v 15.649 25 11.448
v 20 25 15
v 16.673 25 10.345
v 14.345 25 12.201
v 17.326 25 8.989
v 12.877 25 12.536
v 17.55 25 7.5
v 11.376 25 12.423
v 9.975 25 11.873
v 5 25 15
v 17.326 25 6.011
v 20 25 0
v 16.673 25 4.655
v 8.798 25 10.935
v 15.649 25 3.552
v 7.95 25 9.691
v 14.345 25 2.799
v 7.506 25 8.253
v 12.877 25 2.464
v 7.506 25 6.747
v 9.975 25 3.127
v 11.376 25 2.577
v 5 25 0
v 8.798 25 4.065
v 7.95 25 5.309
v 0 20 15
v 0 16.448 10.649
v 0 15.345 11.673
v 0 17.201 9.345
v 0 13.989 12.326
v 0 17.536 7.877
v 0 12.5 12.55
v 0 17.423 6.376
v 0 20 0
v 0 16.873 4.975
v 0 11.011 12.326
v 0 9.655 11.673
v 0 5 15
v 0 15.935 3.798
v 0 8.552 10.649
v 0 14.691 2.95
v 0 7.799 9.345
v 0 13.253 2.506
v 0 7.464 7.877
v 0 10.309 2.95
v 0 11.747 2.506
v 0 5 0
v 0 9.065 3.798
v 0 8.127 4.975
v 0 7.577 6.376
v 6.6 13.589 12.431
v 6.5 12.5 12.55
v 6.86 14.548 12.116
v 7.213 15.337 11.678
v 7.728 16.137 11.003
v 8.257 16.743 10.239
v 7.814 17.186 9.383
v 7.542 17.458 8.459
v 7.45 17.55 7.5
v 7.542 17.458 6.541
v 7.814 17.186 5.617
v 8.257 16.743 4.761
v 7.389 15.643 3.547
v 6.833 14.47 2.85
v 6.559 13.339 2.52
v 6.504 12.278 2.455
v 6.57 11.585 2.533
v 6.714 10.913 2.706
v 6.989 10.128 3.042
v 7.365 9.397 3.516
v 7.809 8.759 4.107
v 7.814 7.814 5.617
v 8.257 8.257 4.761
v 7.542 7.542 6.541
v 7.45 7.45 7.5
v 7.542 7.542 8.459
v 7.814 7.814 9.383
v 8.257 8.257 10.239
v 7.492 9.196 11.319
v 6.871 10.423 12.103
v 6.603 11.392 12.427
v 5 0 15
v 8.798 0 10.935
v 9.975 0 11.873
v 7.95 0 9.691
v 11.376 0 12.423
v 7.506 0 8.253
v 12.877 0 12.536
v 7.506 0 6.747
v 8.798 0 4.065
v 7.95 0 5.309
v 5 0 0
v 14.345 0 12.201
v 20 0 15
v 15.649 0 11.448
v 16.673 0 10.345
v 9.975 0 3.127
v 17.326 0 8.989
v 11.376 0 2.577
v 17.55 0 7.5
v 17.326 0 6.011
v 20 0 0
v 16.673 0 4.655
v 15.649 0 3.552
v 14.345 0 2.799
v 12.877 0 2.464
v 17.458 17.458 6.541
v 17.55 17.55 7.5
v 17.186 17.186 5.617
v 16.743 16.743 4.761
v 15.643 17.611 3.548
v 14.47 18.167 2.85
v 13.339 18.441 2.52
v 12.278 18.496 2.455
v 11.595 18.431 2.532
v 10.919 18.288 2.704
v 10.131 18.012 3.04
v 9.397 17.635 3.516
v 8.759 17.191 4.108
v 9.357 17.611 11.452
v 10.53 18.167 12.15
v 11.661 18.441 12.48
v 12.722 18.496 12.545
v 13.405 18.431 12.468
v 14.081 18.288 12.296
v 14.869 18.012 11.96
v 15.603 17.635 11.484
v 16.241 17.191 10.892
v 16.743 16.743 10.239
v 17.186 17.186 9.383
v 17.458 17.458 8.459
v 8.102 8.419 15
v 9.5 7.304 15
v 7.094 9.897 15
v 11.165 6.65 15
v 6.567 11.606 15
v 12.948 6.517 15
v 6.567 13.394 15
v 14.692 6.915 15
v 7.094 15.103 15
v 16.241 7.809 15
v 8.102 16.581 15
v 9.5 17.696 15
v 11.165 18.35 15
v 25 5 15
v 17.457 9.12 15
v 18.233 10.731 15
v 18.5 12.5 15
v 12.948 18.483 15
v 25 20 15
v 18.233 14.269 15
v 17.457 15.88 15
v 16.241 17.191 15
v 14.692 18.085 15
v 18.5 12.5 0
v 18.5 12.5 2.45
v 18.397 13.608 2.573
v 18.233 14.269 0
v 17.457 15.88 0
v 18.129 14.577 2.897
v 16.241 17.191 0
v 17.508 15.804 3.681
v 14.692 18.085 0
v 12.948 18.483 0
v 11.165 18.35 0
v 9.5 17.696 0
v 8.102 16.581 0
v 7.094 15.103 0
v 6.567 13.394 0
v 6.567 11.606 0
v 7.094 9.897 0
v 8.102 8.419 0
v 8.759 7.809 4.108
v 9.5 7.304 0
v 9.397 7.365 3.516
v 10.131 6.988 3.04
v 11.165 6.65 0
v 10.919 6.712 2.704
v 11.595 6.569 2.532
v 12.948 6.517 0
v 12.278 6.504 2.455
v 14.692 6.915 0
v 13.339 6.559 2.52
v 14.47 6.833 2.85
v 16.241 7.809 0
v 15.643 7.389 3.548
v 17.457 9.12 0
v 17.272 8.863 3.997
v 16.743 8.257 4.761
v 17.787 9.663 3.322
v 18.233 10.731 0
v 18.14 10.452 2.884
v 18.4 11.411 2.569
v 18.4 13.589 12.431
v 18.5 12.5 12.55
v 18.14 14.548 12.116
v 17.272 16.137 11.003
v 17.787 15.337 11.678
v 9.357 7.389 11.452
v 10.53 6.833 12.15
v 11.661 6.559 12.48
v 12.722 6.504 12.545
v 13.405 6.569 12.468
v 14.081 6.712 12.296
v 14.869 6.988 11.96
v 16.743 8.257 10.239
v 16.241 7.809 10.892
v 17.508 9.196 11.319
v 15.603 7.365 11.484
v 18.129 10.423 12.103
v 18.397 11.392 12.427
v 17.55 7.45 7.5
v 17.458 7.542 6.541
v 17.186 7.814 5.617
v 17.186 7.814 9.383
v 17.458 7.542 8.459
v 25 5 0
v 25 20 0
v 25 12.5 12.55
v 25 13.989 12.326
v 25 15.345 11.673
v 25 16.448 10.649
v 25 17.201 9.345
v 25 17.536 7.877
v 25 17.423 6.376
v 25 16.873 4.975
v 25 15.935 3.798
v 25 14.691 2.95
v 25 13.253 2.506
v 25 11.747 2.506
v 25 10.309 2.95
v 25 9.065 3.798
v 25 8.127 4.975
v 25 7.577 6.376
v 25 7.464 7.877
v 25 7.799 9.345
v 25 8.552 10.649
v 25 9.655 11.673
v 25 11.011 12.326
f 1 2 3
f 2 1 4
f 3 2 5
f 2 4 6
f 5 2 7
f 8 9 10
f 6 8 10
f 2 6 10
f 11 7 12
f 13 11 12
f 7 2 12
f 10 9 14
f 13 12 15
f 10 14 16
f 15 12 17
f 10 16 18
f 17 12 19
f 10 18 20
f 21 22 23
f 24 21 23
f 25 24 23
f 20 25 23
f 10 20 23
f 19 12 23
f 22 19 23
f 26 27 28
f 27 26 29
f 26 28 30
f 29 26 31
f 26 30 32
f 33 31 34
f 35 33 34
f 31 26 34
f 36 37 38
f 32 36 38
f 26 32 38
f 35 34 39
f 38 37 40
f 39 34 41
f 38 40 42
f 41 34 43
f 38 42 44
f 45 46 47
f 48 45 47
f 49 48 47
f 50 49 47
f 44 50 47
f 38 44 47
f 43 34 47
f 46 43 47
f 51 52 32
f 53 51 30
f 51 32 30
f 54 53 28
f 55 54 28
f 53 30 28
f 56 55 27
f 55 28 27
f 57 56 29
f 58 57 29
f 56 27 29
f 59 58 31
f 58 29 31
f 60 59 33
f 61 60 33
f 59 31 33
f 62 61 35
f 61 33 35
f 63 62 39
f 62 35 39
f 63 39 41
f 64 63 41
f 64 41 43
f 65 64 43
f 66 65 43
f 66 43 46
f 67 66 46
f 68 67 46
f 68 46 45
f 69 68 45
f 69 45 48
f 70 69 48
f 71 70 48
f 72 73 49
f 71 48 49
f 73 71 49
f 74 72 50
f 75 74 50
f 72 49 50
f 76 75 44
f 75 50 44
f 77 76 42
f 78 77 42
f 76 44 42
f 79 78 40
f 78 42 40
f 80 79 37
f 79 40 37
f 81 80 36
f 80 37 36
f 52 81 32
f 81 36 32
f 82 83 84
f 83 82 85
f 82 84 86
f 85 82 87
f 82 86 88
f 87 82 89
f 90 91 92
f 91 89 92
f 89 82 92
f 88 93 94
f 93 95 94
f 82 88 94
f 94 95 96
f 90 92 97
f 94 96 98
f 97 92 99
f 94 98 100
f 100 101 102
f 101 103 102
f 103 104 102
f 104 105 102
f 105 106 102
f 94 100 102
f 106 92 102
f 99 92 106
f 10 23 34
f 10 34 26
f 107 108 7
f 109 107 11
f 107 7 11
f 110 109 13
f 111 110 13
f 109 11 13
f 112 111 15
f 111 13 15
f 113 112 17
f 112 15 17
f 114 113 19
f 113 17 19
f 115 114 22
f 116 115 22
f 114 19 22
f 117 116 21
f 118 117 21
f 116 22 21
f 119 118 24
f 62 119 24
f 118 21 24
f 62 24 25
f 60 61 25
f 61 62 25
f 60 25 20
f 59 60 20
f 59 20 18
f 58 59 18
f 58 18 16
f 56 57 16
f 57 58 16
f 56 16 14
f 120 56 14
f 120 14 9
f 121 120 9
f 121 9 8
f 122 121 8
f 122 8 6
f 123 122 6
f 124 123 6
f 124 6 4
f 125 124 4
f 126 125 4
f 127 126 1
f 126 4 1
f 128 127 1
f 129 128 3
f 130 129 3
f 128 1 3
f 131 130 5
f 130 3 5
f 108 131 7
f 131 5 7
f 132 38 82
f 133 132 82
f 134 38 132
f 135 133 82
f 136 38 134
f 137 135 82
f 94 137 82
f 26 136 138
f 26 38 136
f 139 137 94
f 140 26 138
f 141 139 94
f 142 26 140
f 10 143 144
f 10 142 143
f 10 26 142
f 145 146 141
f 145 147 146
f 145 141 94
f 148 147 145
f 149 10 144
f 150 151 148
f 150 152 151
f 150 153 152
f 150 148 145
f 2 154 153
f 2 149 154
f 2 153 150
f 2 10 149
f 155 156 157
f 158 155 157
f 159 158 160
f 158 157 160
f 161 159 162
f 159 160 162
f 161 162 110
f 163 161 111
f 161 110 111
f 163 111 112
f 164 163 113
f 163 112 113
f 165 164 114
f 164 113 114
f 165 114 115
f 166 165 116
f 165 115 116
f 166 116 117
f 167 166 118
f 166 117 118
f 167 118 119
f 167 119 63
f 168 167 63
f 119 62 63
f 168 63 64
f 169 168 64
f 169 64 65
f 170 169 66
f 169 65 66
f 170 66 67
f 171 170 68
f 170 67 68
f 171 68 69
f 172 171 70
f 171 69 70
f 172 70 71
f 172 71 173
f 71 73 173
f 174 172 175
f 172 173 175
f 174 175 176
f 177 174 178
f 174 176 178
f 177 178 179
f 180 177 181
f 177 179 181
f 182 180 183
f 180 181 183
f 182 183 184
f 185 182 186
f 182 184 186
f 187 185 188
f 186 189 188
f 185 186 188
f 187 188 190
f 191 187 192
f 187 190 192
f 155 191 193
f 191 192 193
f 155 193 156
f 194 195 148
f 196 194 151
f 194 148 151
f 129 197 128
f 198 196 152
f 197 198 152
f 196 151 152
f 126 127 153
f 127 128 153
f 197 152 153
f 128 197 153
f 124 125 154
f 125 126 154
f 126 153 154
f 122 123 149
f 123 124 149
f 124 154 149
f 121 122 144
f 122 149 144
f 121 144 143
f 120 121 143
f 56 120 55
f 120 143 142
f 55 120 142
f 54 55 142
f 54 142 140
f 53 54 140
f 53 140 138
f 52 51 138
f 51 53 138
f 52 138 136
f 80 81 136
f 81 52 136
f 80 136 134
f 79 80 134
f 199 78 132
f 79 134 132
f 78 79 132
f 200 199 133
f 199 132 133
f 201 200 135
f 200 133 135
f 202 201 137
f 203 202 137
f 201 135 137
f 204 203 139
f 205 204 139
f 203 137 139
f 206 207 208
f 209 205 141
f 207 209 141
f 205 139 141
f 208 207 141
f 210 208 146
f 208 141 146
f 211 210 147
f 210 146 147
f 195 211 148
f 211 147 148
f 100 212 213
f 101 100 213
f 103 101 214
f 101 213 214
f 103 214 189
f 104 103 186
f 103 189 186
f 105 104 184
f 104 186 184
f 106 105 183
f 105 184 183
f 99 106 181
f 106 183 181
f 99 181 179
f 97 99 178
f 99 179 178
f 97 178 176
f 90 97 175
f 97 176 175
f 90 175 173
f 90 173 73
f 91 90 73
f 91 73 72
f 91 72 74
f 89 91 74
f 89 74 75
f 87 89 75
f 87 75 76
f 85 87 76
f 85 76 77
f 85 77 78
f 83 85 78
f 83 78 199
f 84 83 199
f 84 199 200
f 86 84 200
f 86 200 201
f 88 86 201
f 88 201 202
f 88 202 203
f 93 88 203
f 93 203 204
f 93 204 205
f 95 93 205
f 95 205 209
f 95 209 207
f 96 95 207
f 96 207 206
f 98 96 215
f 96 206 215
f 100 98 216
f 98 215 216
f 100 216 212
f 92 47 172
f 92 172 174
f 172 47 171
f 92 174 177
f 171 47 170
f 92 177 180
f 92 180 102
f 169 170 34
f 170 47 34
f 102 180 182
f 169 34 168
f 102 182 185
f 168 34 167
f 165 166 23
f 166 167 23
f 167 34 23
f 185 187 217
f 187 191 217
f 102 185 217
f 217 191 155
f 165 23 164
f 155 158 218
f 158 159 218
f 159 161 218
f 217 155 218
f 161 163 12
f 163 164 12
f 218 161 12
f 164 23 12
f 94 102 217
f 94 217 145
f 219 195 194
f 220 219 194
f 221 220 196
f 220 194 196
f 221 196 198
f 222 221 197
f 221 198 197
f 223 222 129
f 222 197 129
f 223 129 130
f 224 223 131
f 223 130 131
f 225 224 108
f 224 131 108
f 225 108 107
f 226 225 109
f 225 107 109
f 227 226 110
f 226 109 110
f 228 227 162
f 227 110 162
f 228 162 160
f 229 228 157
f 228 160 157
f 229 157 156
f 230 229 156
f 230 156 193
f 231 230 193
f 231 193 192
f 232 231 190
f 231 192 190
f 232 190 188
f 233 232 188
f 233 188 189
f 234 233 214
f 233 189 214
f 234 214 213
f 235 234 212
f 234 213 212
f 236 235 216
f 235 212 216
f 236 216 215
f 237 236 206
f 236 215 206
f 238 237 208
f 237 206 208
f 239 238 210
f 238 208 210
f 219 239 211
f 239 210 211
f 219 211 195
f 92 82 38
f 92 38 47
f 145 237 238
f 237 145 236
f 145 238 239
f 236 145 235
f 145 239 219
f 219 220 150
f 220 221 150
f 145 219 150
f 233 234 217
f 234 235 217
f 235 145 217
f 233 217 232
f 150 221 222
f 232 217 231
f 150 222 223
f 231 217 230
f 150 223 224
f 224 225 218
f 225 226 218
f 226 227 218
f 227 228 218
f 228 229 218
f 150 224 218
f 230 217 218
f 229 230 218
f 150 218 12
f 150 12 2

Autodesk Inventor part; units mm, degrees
ref_plane "YZ Plane" through (0, 0, 0) normal (1, 0, 0) x (0, 1, 0)
ref_plane "XZ Plane" through (0, 0, 0) normal (0, 1, 0) x (-1, 0, 0)
ref_plane "XY Plane" through (0, 0, 0) normal (0, 0, 1) x (1, 0, 0)
sketch "Sketch1" plane through (0, 0, 0) normal (0, 0, 1) x (1, 0, 0)
  point P0 (0, 0)
sketch "Sketch2" plane through (0, 0, 0) normal (0, 0, 1) x (1, 0, 0)
  line L0 (0, 0) -> (25, 0)
  line L1 (25, 0) -> (25, 25)
  line L2 (25, 25) -> (0, 25)
  line L3 (0, 25) -> (0, 0)
  dimension "d0" = 25
  dimension "d1" = 25
extrude "Extrusion1" add sketch "Sketch2" along normal blind 15
chamfer "Chamfer1" distance 5 angle 45 4 edges at (25, 25, 7.5) (25, 0, 7.5) (0, 25, 7.5) (0, 0, 7.5)
sketch "Sketch3" plane through (0, 0, 15) normal (0, 0, 1) x (1, 0, 0)
  line L0 (20, 25) -> (5, 25) projected
  circle A0 centre (12.5, 12.5) radius 6
  line L1 (25, 5) -> (25, 20) projected
  point P0 (0, 0)
  dimension "d7" = 12
  dimension "d8" = 12.5
  dimension "d9" = 12.5
extrude "Extrusion2" cut sketch "Sketch3" against normal blind 15
sketch "Sketch4" plane through (0, 5, 0) normal (-1, 0, 0) x (0, 0, 1)
  circle A0 centre (7.5, 7.5) radius 5.05
  line L0 (15, 20) -> (0, 20) projected
  line L1 (15, 15) -> (15, 0) projected
  point P0 (0, -5)
  dimension "d12" = 10.1
  dimension "d13" = 12.5
  dimension "d14" = 7.5
extrude "Extrusion3" cut sketch "Sketch4" against normal through all
sketch "Sketch5" plane through (5, 25, 0) normal (0, 1, 0) x (1, 0, 0)
  circle A0 centre (7.5, -7.5) radius 5.05
  line L0 (15, 0) -> (0, 0) projected
  line L1 (-5, 0) -> (-5, -15) projected
  dimension "d17" = 10.1
  dimension "d18" = 7.5
  dimension "d19" = 12.5
extrude "Extrusion4" cut sketch "Sketch5" against normal through all
properties part number "nut"
